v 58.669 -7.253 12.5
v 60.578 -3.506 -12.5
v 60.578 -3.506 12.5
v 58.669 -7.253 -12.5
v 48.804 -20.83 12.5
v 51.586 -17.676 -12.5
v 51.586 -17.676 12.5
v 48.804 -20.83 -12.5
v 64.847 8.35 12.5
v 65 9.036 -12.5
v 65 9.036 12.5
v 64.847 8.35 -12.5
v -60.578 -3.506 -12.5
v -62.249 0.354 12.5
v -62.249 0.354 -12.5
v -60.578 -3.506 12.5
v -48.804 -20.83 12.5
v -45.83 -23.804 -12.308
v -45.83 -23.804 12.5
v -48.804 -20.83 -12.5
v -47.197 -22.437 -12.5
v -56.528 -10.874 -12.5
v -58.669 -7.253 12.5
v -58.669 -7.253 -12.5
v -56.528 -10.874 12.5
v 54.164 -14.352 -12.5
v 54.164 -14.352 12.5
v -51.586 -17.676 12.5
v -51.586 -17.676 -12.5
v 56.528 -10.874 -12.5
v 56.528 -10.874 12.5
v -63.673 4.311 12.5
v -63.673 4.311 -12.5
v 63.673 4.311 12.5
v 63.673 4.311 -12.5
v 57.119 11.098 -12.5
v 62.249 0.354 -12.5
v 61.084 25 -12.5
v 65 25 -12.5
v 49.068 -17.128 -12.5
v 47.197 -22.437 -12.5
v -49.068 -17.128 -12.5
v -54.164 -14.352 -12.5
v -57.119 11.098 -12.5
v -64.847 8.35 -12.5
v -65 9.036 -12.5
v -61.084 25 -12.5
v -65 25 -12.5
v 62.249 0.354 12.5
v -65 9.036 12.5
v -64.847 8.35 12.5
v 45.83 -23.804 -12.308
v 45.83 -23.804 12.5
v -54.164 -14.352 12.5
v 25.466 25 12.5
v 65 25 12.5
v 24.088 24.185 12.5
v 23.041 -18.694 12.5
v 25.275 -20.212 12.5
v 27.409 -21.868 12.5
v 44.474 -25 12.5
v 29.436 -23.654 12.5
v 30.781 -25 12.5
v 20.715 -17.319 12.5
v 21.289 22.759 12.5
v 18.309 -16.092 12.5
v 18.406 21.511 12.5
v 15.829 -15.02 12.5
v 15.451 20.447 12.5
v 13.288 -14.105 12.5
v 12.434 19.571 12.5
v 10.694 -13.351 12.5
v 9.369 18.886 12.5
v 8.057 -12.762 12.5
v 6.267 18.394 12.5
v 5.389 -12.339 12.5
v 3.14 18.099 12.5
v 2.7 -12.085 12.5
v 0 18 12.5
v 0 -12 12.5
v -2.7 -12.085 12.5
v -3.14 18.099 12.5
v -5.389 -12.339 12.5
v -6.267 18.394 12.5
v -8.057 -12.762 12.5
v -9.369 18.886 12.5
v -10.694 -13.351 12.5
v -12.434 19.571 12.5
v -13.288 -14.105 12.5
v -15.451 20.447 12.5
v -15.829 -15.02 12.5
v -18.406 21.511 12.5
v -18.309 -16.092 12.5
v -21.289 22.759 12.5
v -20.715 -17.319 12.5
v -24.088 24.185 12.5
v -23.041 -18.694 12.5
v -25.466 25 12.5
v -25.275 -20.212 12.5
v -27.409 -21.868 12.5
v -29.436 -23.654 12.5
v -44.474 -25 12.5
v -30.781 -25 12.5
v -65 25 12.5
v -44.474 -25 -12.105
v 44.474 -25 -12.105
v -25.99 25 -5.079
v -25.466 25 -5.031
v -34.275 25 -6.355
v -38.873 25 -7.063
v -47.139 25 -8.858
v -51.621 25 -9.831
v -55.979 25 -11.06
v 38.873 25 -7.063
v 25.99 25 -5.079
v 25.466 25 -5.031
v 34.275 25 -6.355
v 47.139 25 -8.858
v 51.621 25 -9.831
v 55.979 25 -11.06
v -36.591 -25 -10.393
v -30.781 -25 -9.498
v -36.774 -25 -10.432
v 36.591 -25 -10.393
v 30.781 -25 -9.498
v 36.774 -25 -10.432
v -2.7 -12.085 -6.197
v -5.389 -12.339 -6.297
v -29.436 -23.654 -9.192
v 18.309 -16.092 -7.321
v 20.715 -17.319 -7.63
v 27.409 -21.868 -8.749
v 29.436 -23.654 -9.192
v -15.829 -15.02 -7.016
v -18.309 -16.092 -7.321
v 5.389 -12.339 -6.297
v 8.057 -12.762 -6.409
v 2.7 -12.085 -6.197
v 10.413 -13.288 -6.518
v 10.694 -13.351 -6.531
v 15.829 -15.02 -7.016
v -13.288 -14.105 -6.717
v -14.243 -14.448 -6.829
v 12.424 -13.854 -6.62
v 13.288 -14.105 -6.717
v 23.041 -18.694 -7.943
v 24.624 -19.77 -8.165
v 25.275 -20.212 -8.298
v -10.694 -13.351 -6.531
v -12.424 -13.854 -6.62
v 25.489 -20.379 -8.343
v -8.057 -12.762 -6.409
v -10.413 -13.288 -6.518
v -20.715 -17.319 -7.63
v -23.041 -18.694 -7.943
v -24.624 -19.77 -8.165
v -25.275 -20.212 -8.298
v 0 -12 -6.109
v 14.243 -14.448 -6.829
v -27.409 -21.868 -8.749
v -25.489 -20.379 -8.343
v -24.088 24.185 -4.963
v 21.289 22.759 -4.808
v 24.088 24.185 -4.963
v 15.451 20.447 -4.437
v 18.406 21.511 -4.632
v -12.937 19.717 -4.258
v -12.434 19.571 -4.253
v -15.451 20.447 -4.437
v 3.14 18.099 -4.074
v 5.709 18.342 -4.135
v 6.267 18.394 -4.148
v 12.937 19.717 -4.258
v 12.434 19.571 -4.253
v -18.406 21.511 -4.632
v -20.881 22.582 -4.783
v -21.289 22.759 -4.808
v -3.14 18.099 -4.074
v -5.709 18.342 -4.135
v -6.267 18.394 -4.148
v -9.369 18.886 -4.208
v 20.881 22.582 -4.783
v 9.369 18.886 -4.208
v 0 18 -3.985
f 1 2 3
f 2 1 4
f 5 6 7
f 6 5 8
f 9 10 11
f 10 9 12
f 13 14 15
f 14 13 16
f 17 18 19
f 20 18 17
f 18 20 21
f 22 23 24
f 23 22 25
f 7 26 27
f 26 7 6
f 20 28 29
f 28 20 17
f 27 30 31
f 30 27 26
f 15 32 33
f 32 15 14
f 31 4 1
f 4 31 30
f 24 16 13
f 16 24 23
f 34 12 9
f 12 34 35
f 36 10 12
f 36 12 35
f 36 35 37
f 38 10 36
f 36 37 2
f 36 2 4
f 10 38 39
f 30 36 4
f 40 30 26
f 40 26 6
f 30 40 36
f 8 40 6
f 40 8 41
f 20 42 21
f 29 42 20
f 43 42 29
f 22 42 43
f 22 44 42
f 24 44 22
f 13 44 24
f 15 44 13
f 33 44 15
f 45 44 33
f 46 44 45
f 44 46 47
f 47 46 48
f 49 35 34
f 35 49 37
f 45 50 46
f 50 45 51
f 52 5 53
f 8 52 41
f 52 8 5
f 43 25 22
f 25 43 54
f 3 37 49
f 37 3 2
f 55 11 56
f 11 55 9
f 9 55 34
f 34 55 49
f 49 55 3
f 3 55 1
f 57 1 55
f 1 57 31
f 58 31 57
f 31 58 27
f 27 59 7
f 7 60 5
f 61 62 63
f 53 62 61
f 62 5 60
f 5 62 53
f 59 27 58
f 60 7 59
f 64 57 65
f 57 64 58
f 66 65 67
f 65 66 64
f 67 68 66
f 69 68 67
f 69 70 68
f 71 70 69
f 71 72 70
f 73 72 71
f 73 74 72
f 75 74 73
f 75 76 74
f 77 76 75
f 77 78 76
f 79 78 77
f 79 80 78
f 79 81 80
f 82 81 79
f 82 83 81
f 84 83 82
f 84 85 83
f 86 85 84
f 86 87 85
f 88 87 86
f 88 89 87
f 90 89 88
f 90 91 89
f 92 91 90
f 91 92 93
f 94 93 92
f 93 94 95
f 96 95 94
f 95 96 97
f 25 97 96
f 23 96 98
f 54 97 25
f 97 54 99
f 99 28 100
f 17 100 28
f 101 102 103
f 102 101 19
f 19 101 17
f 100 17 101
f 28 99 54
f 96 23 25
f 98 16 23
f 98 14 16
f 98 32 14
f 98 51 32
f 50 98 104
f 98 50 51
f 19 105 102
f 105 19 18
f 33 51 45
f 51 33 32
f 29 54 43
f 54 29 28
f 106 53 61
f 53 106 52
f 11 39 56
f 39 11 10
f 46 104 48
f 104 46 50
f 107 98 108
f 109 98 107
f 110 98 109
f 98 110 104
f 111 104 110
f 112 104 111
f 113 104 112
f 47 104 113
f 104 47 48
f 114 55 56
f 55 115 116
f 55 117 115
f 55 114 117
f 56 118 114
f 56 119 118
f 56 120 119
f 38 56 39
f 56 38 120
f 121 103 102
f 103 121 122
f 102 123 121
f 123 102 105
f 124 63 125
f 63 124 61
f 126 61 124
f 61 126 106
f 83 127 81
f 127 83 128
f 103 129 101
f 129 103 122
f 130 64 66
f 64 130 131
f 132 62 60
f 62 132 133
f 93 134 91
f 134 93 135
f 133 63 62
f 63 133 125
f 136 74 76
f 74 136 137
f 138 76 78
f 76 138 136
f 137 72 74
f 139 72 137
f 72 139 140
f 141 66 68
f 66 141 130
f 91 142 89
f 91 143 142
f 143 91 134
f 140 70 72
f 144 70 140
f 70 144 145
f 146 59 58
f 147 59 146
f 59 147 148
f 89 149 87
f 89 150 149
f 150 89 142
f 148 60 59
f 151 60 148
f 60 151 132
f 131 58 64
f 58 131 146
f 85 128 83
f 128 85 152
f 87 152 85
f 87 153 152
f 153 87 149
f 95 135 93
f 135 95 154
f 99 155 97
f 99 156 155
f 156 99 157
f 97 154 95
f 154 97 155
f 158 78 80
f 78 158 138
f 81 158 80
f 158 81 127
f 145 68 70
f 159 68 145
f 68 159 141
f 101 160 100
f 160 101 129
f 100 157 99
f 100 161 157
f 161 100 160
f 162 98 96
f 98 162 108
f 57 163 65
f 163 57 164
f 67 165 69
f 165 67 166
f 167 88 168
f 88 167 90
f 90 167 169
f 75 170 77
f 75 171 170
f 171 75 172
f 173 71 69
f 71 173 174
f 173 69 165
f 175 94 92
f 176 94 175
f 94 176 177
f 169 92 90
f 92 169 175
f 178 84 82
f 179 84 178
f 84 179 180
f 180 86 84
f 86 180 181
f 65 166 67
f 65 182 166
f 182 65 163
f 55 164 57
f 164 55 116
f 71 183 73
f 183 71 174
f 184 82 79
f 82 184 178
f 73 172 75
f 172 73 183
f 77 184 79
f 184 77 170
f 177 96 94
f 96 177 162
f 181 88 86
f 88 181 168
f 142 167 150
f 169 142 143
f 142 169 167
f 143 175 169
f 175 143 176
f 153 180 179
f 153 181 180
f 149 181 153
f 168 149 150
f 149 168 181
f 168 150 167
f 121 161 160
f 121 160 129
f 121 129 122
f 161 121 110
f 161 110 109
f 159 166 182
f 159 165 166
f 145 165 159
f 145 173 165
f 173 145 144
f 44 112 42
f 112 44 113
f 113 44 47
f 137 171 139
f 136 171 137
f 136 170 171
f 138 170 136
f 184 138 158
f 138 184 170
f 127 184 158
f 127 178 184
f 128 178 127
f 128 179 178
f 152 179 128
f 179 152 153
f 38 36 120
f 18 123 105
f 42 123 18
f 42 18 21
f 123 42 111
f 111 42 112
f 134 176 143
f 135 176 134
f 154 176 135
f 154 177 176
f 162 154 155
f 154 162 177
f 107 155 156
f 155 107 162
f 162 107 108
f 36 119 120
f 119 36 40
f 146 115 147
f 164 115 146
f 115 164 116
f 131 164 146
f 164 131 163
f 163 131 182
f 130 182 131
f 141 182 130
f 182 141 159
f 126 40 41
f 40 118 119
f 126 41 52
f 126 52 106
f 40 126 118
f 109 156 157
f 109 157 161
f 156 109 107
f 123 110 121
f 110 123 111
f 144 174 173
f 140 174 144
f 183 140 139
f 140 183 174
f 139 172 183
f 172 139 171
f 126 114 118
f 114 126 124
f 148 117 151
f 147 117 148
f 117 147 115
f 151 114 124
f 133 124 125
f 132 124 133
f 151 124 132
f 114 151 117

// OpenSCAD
$fn=100;

//support_width = 130;
//support_length = 50;
//support_height = 25;

support_width = 130;
support_length = 50;
support_height = 25;

difference(){
intersection() {
    translate([0,support_length/2,0])cylinder(h=support_height,r=support_width*0.515, center=true);
    cube([support_width,support_length,support_height],true);
}

translate([0,-support_length*1.1,0])cylinder(h=support_height*1.04,r=support_length*0.86, center=true);
translate([0,support_length*1.36,0])cylinder(h=support_height*1.04,r=support_length, center=true);
translate([0,-support_height*0.8,-support_width*1.585])rotate([80,0,0])cylinder(h=support_length*1.6,r1=support_width*1.654,r2=support_width*1.5, center=true);
//translate([0,0,64])rotate([90,0,0])cylinder(h=150,r=60, center=true);
}
